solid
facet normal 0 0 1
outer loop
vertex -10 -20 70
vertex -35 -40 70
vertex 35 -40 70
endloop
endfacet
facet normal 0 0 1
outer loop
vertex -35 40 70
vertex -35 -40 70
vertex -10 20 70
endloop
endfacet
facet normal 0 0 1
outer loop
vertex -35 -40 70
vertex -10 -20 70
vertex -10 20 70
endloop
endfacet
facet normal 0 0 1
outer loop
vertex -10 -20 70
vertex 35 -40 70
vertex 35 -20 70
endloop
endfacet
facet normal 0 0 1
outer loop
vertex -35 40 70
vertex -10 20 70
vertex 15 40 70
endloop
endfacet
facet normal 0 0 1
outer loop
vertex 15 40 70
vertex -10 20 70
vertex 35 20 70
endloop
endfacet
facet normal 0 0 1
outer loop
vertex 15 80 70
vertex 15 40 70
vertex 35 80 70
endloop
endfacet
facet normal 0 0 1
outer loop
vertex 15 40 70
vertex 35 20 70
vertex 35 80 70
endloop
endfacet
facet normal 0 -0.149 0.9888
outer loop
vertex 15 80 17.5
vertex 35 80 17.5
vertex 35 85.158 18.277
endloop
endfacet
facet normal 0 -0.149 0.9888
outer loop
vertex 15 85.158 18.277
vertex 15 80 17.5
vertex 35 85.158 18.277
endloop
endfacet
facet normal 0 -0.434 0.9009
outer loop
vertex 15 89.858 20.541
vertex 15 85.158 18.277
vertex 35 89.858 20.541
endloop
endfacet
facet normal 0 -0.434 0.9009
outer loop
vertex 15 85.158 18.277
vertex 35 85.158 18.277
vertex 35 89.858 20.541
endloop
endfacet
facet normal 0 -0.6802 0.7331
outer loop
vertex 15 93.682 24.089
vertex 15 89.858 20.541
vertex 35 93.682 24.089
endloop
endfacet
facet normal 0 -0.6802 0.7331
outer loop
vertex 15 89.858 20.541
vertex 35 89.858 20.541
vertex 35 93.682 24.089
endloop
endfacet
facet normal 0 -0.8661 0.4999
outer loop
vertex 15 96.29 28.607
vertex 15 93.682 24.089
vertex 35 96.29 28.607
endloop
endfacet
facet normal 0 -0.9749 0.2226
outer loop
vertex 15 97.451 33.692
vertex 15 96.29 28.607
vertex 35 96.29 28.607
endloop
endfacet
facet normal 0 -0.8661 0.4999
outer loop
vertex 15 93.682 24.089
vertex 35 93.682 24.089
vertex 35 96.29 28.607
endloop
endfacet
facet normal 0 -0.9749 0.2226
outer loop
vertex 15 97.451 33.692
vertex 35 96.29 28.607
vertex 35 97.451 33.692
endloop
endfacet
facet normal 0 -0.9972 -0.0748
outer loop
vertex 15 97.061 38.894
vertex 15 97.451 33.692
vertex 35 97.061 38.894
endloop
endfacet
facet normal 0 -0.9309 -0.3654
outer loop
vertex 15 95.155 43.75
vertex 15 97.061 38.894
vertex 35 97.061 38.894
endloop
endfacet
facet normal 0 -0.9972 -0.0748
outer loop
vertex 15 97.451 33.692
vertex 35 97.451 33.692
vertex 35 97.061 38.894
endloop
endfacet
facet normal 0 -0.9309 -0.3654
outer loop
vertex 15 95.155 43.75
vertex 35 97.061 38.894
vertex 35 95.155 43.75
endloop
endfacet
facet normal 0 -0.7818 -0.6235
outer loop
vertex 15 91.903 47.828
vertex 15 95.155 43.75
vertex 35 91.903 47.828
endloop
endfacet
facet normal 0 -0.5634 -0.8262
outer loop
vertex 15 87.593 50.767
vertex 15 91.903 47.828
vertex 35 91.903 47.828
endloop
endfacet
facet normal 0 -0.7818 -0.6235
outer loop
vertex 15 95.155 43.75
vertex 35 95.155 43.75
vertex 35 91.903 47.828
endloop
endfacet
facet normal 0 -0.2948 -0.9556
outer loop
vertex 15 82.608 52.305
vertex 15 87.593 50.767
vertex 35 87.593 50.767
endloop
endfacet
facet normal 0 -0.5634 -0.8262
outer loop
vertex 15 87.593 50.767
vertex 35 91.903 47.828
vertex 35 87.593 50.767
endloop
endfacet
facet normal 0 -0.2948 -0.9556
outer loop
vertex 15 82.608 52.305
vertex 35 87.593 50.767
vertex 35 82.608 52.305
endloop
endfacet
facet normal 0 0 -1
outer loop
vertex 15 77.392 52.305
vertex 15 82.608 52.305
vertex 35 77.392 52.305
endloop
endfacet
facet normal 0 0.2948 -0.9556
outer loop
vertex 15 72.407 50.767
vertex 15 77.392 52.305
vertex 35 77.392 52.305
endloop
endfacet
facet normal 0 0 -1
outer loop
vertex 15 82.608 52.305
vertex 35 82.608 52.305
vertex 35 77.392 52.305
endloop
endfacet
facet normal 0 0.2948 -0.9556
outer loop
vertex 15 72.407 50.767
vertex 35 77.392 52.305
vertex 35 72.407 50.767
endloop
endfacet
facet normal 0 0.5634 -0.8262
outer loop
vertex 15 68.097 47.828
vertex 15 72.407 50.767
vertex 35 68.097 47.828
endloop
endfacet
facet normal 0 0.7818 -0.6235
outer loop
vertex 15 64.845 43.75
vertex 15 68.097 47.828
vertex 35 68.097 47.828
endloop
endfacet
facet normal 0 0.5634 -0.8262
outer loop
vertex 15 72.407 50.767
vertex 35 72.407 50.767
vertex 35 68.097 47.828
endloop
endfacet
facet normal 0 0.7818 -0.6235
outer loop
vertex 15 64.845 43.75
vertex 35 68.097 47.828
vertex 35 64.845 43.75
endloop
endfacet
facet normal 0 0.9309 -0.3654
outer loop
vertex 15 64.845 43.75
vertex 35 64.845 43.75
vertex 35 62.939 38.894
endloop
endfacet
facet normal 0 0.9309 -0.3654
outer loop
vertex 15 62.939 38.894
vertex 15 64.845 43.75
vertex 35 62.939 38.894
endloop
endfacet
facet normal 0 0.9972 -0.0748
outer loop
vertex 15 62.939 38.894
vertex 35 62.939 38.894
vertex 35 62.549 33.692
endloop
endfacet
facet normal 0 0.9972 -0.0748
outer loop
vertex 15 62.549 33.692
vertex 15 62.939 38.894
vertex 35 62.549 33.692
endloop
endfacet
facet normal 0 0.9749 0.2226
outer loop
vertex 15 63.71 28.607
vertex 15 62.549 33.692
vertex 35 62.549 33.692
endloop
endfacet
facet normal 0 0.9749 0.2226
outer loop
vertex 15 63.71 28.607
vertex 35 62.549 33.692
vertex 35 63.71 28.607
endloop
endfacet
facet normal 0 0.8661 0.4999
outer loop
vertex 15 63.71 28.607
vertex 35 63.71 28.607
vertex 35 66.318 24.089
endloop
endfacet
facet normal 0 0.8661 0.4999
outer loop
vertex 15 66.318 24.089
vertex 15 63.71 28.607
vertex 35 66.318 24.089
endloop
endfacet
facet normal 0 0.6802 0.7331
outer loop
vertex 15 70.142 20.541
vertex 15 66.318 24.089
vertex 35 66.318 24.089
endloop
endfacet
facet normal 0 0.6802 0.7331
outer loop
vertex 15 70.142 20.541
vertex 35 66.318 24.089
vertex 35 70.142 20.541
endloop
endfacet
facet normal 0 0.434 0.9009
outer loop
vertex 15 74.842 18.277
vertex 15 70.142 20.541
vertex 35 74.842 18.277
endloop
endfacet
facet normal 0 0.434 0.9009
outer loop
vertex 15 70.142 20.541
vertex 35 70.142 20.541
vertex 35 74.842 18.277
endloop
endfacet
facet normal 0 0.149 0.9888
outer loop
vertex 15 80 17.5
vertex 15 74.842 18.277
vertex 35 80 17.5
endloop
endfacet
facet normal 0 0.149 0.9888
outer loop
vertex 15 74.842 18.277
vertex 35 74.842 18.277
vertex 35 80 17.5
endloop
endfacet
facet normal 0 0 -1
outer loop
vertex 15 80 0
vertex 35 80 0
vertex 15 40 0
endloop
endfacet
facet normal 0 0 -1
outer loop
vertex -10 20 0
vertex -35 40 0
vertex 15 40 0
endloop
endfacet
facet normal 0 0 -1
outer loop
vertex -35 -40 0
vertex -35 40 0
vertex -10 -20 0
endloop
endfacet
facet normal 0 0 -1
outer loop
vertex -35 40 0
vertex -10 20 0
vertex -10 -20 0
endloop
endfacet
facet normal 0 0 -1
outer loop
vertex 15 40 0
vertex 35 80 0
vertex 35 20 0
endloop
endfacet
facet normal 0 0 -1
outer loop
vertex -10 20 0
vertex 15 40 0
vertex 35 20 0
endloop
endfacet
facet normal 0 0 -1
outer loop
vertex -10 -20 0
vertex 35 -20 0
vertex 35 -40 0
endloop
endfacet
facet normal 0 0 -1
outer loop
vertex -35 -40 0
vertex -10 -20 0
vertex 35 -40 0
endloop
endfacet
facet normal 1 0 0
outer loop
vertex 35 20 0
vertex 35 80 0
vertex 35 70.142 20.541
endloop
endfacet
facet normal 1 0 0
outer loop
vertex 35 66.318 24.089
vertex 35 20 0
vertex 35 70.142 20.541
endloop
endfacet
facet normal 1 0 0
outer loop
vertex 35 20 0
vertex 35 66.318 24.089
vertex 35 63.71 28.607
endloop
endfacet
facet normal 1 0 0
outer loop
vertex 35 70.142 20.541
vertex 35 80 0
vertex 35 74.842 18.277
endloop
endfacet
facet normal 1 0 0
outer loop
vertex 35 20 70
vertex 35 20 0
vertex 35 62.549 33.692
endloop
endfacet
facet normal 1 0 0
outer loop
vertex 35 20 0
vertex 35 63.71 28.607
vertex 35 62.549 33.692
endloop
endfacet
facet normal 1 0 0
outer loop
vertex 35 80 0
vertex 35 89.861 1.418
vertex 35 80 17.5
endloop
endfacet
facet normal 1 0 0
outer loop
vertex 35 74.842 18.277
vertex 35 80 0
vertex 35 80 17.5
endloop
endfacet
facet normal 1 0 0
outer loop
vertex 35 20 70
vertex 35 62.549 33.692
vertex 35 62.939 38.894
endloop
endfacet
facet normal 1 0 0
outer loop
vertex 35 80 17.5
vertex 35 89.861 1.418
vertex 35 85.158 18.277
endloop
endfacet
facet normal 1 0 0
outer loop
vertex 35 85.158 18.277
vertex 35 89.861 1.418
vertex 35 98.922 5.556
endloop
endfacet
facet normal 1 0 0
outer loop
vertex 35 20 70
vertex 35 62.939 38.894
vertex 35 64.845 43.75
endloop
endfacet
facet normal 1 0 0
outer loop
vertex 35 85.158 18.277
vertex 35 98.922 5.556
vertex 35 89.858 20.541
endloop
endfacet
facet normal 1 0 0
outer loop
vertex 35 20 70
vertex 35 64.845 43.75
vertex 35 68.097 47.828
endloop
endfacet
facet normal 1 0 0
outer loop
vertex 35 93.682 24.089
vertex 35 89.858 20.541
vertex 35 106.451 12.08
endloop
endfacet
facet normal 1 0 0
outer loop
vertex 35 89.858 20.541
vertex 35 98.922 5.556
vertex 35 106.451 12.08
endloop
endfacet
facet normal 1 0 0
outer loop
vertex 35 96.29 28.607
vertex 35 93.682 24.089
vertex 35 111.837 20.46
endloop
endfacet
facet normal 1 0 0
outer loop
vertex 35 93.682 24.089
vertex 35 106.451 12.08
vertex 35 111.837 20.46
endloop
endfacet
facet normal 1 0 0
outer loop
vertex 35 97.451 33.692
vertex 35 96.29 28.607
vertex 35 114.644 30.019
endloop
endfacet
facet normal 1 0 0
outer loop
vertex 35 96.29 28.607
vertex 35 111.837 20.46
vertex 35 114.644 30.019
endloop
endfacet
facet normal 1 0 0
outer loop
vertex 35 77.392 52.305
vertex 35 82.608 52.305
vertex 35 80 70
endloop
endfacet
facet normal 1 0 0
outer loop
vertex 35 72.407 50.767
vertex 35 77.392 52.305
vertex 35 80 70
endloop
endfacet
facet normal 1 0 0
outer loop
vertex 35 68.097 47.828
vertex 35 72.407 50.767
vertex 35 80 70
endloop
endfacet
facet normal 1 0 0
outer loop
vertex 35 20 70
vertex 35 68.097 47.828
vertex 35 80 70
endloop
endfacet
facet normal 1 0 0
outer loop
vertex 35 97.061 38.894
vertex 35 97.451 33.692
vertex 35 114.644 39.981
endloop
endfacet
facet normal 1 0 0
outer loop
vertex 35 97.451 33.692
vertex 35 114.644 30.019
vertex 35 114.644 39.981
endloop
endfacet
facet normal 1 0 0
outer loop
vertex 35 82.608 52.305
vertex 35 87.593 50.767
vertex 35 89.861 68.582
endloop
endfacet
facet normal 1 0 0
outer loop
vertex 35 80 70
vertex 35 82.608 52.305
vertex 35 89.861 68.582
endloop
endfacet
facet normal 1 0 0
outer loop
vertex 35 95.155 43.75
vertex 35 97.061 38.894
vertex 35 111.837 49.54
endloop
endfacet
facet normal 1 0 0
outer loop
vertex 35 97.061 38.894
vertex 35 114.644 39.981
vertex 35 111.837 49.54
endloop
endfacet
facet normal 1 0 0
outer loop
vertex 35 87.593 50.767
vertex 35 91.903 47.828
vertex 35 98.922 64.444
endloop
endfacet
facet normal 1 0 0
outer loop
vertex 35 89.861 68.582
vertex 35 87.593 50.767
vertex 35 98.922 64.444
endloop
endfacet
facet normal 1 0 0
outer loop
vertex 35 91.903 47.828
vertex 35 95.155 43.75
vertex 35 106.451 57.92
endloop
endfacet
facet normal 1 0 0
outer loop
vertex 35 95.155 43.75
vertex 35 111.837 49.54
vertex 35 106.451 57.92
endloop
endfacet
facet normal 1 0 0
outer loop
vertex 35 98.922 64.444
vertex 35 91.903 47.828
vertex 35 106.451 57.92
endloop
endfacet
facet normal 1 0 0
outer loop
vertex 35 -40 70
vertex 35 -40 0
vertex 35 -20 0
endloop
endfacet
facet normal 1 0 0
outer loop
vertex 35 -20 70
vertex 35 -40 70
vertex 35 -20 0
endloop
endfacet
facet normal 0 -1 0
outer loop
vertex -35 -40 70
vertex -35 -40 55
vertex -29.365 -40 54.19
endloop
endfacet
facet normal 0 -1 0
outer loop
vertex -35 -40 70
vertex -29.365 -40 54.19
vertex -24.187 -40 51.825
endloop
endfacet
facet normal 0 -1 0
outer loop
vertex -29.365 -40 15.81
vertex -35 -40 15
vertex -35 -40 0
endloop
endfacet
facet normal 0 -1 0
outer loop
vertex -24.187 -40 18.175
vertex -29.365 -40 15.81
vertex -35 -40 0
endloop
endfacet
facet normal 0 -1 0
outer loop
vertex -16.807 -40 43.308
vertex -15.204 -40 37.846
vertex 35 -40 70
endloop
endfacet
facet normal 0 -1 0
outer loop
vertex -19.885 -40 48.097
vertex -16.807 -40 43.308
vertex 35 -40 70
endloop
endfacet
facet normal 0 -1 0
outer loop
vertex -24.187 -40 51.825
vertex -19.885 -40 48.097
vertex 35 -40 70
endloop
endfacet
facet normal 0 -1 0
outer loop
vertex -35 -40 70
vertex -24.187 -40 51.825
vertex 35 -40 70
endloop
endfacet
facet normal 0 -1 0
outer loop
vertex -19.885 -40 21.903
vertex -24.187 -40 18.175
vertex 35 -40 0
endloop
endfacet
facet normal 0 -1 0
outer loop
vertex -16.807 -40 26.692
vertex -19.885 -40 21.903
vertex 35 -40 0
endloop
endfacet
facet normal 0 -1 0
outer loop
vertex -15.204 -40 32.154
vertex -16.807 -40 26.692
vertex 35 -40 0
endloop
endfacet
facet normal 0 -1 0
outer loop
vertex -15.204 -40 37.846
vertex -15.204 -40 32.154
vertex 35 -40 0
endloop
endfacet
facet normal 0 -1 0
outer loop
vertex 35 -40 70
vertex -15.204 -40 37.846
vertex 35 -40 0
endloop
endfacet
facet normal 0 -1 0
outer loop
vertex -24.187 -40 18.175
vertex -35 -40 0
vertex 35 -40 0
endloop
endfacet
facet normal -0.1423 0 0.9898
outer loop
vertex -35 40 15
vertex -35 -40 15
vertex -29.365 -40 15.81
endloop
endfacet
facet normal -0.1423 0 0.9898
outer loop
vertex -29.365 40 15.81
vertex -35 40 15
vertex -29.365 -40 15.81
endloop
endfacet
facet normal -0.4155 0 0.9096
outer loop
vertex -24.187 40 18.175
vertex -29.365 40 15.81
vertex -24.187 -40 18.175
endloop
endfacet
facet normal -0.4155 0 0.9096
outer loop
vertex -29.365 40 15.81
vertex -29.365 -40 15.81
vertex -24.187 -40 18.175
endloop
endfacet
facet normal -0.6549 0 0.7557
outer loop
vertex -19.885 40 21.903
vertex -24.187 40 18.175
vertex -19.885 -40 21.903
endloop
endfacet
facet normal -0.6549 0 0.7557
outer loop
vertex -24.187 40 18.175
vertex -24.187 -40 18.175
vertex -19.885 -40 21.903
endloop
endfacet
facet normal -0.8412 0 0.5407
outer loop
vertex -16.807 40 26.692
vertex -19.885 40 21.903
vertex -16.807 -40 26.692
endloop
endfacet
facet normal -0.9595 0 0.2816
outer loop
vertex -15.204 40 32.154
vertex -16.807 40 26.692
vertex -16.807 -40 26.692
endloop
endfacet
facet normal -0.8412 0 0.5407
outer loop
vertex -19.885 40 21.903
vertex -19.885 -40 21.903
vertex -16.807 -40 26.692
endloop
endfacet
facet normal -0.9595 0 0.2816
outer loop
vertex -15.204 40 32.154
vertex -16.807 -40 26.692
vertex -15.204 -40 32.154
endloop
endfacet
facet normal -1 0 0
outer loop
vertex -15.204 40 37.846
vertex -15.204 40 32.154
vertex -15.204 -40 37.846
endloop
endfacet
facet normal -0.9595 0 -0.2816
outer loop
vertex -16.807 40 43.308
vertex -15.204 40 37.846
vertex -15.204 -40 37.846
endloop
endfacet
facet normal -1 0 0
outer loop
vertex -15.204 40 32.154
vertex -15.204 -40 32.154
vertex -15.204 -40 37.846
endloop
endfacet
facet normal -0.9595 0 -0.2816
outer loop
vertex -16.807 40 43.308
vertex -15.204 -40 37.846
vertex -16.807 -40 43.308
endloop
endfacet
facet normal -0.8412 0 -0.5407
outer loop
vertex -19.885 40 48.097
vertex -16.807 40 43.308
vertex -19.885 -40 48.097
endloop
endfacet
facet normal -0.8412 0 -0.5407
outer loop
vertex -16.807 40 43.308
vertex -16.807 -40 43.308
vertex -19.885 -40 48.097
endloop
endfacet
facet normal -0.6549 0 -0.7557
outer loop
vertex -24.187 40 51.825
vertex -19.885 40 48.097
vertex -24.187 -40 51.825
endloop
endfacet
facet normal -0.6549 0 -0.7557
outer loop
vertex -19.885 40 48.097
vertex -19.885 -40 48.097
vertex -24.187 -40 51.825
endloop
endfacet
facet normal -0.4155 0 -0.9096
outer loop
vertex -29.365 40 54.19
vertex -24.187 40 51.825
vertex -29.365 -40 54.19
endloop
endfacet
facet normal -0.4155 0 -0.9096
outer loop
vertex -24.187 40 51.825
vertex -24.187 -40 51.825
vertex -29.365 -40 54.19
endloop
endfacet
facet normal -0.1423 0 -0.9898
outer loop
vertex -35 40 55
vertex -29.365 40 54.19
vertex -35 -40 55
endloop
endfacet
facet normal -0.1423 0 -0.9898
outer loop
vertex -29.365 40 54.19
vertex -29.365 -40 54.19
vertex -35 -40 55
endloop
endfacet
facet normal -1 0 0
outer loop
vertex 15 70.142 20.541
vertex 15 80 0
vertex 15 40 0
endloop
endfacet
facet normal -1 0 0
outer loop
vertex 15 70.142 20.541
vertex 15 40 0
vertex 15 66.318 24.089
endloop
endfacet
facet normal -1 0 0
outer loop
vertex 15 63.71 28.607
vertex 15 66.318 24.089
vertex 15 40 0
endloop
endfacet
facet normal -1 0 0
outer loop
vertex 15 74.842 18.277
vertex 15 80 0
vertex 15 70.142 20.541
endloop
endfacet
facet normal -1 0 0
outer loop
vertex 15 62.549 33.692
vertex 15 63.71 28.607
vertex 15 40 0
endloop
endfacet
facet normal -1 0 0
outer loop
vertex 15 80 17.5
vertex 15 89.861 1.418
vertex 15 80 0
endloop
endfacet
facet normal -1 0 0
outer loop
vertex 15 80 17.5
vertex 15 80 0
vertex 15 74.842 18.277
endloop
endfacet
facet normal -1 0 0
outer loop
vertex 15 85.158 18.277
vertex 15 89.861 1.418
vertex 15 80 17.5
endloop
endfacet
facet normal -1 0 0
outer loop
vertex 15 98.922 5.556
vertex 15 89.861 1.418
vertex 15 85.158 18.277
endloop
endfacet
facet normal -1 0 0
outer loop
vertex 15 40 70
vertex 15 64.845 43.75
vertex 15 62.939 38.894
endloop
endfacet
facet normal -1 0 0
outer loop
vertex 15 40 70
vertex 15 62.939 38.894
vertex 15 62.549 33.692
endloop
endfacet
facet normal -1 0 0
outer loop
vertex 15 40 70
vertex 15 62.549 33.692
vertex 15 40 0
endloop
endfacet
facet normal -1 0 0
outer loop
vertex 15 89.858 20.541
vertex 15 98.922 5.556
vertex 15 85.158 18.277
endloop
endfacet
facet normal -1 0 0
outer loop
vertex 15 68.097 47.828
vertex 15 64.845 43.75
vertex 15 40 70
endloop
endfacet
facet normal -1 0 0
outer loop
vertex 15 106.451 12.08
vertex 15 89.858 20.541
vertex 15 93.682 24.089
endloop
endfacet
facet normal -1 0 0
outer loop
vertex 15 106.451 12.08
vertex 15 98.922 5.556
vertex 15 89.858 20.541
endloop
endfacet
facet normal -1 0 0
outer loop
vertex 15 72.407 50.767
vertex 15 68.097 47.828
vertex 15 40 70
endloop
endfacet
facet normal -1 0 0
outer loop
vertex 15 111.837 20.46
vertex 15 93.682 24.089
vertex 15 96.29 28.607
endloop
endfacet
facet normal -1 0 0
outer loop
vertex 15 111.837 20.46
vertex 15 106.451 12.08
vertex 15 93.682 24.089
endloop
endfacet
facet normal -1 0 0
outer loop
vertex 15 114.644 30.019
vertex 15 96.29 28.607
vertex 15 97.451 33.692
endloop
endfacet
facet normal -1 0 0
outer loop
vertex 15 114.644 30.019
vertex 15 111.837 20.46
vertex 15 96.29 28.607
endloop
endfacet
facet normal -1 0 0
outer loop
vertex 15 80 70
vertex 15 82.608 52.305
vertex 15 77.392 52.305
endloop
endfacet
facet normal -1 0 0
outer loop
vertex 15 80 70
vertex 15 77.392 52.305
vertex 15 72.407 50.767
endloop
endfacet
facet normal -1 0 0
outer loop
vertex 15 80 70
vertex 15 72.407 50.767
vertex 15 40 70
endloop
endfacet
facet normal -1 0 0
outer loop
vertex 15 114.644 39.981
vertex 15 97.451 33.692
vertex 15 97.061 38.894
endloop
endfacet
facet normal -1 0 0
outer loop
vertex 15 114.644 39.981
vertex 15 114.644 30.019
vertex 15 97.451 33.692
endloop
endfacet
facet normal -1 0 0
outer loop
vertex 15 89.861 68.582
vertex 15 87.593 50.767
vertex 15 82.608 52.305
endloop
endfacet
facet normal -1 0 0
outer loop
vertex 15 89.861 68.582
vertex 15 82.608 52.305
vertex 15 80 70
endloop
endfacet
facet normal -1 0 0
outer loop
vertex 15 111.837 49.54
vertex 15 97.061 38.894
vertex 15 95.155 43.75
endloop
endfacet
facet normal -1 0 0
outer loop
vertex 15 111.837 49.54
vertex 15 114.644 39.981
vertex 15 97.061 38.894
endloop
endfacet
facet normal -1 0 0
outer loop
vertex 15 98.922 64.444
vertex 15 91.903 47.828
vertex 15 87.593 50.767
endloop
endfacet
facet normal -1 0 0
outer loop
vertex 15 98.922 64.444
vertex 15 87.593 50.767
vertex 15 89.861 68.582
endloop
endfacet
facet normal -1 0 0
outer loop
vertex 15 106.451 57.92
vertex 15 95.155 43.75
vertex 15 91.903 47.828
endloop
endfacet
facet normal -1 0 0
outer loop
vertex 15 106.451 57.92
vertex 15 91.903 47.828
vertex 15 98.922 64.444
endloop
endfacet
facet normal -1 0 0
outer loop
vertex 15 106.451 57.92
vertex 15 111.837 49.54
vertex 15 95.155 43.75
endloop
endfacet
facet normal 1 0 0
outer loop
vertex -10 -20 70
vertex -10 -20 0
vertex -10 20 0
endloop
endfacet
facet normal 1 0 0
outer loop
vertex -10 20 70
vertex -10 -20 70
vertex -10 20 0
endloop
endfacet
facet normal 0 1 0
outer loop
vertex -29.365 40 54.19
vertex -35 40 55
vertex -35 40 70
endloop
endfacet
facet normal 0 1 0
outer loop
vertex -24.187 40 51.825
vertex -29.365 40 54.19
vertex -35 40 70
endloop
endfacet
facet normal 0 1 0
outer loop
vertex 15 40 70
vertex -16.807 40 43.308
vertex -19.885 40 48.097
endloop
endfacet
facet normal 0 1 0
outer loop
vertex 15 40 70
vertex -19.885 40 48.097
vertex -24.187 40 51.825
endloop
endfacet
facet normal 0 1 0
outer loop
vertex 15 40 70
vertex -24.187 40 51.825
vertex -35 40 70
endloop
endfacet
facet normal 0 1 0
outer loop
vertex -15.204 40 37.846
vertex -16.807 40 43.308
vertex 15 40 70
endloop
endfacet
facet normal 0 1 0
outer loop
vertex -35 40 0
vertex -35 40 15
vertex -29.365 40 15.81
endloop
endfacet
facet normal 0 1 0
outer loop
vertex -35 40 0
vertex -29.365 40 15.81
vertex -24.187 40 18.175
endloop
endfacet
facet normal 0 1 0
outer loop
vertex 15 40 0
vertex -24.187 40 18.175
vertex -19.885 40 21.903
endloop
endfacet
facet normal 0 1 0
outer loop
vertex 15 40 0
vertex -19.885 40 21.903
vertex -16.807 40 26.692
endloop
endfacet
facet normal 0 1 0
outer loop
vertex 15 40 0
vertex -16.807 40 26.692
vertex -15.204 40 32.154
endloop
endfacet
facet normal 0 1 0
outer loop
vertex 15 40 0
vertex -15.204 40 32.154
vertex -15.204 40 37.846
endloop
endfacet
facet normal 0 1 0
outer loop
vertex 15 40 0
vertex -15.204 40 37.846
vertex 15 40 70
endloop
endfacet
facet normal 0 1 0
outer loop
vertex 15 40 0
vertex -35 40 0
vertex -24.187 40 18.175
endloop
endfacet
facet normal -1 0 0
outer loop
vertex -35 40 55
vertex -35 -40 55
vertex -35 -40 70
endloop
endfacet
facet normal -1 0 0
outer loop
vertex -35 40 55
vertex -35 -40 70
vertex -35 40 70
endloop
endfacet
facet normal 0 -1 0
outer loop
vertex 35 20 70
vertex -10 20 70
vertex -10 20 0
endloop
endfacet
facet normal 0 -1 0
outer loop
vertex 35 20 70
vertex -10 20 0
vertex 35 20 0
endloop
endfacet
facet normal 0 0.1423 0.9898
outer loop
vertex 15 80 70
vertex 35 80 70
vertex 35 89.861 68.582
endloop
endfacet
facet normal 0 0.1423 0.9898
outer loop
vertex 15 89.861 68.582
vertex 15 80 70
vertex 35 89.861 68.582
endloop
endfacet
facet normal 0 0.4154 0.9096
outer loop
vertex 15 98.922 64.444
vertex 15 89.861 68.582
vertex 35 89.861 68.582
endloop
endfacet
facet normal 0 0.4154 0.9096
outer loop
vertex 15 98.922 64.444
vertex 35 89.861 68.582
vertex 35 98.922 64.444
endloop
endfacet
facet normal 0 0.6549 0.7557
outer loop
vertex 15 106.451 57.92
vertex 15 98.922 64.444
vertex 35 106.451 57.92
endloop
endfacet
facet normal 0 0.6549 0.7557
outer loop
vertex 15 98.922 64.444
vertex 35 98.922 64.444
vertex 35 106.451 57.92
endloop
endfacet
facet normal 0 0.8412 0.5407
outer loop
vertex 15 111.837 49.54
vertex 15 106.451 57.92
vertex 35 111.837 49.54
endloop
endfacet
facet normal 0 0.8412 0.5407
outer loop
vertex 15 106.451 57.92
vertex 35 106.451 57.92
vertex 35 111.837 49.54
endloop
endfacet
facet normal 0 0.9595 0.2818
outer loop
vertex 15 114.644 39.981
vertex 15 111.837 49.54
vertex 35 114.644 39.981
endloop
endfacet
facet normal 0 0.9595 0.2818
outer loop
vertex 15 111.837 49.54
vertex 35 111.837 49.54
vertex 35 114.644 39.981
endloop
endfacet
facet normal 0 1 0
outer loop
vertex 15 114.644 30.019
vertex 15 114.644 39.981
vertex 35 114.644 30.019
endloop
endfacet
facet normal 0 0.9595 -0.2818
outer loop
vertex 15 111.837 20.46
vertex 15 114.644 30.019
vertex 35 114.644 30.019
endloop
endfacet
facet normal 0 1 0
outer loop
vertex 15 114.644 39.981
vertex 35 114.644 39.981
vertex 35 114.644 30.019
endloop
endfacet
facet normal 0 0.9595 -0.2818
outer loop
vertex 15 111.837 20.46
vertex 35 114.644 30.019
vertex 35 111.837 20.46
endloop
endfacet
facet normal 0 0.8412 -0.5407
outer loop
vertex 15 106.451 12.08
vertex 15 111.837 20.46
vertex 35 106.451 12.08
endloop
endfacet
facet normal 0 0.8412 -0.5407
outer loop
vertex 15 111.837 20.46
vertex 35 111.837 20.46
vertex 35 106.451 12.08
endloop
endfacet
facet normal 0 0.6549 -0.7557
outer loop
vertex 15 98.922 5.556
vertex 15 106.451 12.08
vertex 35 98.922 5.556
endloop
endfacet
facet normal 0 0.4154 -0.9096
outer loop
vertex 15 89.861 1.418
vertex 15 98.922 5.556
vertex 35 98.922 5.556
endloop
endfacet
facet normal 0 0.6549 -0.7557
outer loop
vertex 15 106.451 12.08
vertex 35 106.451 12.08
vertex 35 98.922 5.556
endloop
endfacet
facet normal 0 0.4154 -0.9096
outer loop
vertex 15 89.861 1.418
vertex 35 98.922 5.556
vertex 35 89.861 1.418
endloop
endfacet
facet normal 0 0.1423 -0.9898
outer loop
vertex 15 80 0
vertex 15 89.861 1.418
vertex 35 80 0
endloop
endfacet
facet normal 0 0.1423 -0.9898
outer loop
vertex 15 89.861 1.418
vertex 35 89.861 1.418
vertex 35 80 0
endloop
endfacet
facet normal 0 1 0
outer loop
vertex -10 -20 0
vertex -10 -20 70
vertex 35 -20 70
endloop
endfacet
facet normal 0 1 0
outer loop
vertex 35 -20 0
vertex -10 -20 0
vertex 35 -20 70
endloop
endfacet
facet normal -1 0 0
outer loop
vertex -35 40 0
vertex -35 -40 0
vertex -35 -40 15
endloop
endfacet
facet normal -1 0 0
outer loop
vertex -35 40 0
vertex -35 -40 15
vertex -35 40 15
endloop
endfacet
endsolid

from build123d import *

# Parameters (mm, degrees)
SKETCH1_W               = 70
SKETCH1_H               = 80
BOSS_EXTRUDE1_DEPTH     = 70
SKETCH2_W               = 45
SKETCH2_H               = 40
CUT_EXTRUDE1_DEPTH      = 70
CUT_EXTRUDE2_DEPTH      = 112.915146428
CUT_EXTRUDE2_DEPTH_BACK = 112.915146428
BOSS_EXTRUDE2_DEPTH     = 20
SKETCH5_R               = 17.5
CUT_EXTRUDE3_DEPTH      = 20


with BuildPart() as part:
    # Sketch1 → Boss-Extrude1 (new body)
    with BuildSketch(Plane.XY):
        Rectangle(SKETCH1_W, SKETCH1_H)
    extrude(amount=BOSS_EXTRUDE1_DEPTH)

    # Sketch2 → Cut-Extrude1 (cut)
    with BuildSketch(Plane.XY.offset(70)):
        with Locations((12.5, 0)):
            Rectangle(SKETCH2_W, SKETCH2_H)
    extrude(amount=-CUT_EXTRUDE1_DEPTH, mode=Mode.SUBTRACT)

    # Sketch3 → Cut-Extrude2 (cut, two sides: drawn at the far end of the back side and taken through both)
    with BuildSketch(Plane(origin=(0, 40, 0), x_dir=(1, 0, 0), z_dir=(0, 1, 0)).offset(-CUT_EXTRUDE2_DEPTH_BACK)):
        with BuildLine():
            Line((-35, -55), (-35, -15))
            ThreePointArc((-35, -15), (-15, -35), (-35, -55))
        make_face()
    extrude(amount=CUT_EXTRUDE2_DEPTH + CUT_EXTRUDE2_DEPTH_BACK, mode=Mode.SUBTRACT)

    # Sketch4 → Boss-Extrude2 (add)
    with BuildSketch(Plane(origin=(35, 0, 0), x_dir=(0, 0, -1), z_dir=(1, 0, 0))):
        with BuildLine():
            Line((-70, 40), (-70, 80))
            ThreePointArc((-70, 80), (-35, 115), (0, 80))
            Line((0, 80), (0, 40))
            Line((0, 40), (-70, 40))
        make_face()
    extrude(amount=-BOSS_EXTRUDE2_DEPTH)

    # Sketch5 → Cut-Extrude3 (cut)
    with BuildSketch(Plane(origin=(35, 0, 0), x_dir=(0, 0, -1), z_dir=(1, 0, 0))):
        with Locations((-35, 80)):
            Circle(SKETCH5_R)
    extrude(amount=-CUT_EXTRUDE3_DEPTH, mode=Mode.SUBTRACT)


solid = part.part
